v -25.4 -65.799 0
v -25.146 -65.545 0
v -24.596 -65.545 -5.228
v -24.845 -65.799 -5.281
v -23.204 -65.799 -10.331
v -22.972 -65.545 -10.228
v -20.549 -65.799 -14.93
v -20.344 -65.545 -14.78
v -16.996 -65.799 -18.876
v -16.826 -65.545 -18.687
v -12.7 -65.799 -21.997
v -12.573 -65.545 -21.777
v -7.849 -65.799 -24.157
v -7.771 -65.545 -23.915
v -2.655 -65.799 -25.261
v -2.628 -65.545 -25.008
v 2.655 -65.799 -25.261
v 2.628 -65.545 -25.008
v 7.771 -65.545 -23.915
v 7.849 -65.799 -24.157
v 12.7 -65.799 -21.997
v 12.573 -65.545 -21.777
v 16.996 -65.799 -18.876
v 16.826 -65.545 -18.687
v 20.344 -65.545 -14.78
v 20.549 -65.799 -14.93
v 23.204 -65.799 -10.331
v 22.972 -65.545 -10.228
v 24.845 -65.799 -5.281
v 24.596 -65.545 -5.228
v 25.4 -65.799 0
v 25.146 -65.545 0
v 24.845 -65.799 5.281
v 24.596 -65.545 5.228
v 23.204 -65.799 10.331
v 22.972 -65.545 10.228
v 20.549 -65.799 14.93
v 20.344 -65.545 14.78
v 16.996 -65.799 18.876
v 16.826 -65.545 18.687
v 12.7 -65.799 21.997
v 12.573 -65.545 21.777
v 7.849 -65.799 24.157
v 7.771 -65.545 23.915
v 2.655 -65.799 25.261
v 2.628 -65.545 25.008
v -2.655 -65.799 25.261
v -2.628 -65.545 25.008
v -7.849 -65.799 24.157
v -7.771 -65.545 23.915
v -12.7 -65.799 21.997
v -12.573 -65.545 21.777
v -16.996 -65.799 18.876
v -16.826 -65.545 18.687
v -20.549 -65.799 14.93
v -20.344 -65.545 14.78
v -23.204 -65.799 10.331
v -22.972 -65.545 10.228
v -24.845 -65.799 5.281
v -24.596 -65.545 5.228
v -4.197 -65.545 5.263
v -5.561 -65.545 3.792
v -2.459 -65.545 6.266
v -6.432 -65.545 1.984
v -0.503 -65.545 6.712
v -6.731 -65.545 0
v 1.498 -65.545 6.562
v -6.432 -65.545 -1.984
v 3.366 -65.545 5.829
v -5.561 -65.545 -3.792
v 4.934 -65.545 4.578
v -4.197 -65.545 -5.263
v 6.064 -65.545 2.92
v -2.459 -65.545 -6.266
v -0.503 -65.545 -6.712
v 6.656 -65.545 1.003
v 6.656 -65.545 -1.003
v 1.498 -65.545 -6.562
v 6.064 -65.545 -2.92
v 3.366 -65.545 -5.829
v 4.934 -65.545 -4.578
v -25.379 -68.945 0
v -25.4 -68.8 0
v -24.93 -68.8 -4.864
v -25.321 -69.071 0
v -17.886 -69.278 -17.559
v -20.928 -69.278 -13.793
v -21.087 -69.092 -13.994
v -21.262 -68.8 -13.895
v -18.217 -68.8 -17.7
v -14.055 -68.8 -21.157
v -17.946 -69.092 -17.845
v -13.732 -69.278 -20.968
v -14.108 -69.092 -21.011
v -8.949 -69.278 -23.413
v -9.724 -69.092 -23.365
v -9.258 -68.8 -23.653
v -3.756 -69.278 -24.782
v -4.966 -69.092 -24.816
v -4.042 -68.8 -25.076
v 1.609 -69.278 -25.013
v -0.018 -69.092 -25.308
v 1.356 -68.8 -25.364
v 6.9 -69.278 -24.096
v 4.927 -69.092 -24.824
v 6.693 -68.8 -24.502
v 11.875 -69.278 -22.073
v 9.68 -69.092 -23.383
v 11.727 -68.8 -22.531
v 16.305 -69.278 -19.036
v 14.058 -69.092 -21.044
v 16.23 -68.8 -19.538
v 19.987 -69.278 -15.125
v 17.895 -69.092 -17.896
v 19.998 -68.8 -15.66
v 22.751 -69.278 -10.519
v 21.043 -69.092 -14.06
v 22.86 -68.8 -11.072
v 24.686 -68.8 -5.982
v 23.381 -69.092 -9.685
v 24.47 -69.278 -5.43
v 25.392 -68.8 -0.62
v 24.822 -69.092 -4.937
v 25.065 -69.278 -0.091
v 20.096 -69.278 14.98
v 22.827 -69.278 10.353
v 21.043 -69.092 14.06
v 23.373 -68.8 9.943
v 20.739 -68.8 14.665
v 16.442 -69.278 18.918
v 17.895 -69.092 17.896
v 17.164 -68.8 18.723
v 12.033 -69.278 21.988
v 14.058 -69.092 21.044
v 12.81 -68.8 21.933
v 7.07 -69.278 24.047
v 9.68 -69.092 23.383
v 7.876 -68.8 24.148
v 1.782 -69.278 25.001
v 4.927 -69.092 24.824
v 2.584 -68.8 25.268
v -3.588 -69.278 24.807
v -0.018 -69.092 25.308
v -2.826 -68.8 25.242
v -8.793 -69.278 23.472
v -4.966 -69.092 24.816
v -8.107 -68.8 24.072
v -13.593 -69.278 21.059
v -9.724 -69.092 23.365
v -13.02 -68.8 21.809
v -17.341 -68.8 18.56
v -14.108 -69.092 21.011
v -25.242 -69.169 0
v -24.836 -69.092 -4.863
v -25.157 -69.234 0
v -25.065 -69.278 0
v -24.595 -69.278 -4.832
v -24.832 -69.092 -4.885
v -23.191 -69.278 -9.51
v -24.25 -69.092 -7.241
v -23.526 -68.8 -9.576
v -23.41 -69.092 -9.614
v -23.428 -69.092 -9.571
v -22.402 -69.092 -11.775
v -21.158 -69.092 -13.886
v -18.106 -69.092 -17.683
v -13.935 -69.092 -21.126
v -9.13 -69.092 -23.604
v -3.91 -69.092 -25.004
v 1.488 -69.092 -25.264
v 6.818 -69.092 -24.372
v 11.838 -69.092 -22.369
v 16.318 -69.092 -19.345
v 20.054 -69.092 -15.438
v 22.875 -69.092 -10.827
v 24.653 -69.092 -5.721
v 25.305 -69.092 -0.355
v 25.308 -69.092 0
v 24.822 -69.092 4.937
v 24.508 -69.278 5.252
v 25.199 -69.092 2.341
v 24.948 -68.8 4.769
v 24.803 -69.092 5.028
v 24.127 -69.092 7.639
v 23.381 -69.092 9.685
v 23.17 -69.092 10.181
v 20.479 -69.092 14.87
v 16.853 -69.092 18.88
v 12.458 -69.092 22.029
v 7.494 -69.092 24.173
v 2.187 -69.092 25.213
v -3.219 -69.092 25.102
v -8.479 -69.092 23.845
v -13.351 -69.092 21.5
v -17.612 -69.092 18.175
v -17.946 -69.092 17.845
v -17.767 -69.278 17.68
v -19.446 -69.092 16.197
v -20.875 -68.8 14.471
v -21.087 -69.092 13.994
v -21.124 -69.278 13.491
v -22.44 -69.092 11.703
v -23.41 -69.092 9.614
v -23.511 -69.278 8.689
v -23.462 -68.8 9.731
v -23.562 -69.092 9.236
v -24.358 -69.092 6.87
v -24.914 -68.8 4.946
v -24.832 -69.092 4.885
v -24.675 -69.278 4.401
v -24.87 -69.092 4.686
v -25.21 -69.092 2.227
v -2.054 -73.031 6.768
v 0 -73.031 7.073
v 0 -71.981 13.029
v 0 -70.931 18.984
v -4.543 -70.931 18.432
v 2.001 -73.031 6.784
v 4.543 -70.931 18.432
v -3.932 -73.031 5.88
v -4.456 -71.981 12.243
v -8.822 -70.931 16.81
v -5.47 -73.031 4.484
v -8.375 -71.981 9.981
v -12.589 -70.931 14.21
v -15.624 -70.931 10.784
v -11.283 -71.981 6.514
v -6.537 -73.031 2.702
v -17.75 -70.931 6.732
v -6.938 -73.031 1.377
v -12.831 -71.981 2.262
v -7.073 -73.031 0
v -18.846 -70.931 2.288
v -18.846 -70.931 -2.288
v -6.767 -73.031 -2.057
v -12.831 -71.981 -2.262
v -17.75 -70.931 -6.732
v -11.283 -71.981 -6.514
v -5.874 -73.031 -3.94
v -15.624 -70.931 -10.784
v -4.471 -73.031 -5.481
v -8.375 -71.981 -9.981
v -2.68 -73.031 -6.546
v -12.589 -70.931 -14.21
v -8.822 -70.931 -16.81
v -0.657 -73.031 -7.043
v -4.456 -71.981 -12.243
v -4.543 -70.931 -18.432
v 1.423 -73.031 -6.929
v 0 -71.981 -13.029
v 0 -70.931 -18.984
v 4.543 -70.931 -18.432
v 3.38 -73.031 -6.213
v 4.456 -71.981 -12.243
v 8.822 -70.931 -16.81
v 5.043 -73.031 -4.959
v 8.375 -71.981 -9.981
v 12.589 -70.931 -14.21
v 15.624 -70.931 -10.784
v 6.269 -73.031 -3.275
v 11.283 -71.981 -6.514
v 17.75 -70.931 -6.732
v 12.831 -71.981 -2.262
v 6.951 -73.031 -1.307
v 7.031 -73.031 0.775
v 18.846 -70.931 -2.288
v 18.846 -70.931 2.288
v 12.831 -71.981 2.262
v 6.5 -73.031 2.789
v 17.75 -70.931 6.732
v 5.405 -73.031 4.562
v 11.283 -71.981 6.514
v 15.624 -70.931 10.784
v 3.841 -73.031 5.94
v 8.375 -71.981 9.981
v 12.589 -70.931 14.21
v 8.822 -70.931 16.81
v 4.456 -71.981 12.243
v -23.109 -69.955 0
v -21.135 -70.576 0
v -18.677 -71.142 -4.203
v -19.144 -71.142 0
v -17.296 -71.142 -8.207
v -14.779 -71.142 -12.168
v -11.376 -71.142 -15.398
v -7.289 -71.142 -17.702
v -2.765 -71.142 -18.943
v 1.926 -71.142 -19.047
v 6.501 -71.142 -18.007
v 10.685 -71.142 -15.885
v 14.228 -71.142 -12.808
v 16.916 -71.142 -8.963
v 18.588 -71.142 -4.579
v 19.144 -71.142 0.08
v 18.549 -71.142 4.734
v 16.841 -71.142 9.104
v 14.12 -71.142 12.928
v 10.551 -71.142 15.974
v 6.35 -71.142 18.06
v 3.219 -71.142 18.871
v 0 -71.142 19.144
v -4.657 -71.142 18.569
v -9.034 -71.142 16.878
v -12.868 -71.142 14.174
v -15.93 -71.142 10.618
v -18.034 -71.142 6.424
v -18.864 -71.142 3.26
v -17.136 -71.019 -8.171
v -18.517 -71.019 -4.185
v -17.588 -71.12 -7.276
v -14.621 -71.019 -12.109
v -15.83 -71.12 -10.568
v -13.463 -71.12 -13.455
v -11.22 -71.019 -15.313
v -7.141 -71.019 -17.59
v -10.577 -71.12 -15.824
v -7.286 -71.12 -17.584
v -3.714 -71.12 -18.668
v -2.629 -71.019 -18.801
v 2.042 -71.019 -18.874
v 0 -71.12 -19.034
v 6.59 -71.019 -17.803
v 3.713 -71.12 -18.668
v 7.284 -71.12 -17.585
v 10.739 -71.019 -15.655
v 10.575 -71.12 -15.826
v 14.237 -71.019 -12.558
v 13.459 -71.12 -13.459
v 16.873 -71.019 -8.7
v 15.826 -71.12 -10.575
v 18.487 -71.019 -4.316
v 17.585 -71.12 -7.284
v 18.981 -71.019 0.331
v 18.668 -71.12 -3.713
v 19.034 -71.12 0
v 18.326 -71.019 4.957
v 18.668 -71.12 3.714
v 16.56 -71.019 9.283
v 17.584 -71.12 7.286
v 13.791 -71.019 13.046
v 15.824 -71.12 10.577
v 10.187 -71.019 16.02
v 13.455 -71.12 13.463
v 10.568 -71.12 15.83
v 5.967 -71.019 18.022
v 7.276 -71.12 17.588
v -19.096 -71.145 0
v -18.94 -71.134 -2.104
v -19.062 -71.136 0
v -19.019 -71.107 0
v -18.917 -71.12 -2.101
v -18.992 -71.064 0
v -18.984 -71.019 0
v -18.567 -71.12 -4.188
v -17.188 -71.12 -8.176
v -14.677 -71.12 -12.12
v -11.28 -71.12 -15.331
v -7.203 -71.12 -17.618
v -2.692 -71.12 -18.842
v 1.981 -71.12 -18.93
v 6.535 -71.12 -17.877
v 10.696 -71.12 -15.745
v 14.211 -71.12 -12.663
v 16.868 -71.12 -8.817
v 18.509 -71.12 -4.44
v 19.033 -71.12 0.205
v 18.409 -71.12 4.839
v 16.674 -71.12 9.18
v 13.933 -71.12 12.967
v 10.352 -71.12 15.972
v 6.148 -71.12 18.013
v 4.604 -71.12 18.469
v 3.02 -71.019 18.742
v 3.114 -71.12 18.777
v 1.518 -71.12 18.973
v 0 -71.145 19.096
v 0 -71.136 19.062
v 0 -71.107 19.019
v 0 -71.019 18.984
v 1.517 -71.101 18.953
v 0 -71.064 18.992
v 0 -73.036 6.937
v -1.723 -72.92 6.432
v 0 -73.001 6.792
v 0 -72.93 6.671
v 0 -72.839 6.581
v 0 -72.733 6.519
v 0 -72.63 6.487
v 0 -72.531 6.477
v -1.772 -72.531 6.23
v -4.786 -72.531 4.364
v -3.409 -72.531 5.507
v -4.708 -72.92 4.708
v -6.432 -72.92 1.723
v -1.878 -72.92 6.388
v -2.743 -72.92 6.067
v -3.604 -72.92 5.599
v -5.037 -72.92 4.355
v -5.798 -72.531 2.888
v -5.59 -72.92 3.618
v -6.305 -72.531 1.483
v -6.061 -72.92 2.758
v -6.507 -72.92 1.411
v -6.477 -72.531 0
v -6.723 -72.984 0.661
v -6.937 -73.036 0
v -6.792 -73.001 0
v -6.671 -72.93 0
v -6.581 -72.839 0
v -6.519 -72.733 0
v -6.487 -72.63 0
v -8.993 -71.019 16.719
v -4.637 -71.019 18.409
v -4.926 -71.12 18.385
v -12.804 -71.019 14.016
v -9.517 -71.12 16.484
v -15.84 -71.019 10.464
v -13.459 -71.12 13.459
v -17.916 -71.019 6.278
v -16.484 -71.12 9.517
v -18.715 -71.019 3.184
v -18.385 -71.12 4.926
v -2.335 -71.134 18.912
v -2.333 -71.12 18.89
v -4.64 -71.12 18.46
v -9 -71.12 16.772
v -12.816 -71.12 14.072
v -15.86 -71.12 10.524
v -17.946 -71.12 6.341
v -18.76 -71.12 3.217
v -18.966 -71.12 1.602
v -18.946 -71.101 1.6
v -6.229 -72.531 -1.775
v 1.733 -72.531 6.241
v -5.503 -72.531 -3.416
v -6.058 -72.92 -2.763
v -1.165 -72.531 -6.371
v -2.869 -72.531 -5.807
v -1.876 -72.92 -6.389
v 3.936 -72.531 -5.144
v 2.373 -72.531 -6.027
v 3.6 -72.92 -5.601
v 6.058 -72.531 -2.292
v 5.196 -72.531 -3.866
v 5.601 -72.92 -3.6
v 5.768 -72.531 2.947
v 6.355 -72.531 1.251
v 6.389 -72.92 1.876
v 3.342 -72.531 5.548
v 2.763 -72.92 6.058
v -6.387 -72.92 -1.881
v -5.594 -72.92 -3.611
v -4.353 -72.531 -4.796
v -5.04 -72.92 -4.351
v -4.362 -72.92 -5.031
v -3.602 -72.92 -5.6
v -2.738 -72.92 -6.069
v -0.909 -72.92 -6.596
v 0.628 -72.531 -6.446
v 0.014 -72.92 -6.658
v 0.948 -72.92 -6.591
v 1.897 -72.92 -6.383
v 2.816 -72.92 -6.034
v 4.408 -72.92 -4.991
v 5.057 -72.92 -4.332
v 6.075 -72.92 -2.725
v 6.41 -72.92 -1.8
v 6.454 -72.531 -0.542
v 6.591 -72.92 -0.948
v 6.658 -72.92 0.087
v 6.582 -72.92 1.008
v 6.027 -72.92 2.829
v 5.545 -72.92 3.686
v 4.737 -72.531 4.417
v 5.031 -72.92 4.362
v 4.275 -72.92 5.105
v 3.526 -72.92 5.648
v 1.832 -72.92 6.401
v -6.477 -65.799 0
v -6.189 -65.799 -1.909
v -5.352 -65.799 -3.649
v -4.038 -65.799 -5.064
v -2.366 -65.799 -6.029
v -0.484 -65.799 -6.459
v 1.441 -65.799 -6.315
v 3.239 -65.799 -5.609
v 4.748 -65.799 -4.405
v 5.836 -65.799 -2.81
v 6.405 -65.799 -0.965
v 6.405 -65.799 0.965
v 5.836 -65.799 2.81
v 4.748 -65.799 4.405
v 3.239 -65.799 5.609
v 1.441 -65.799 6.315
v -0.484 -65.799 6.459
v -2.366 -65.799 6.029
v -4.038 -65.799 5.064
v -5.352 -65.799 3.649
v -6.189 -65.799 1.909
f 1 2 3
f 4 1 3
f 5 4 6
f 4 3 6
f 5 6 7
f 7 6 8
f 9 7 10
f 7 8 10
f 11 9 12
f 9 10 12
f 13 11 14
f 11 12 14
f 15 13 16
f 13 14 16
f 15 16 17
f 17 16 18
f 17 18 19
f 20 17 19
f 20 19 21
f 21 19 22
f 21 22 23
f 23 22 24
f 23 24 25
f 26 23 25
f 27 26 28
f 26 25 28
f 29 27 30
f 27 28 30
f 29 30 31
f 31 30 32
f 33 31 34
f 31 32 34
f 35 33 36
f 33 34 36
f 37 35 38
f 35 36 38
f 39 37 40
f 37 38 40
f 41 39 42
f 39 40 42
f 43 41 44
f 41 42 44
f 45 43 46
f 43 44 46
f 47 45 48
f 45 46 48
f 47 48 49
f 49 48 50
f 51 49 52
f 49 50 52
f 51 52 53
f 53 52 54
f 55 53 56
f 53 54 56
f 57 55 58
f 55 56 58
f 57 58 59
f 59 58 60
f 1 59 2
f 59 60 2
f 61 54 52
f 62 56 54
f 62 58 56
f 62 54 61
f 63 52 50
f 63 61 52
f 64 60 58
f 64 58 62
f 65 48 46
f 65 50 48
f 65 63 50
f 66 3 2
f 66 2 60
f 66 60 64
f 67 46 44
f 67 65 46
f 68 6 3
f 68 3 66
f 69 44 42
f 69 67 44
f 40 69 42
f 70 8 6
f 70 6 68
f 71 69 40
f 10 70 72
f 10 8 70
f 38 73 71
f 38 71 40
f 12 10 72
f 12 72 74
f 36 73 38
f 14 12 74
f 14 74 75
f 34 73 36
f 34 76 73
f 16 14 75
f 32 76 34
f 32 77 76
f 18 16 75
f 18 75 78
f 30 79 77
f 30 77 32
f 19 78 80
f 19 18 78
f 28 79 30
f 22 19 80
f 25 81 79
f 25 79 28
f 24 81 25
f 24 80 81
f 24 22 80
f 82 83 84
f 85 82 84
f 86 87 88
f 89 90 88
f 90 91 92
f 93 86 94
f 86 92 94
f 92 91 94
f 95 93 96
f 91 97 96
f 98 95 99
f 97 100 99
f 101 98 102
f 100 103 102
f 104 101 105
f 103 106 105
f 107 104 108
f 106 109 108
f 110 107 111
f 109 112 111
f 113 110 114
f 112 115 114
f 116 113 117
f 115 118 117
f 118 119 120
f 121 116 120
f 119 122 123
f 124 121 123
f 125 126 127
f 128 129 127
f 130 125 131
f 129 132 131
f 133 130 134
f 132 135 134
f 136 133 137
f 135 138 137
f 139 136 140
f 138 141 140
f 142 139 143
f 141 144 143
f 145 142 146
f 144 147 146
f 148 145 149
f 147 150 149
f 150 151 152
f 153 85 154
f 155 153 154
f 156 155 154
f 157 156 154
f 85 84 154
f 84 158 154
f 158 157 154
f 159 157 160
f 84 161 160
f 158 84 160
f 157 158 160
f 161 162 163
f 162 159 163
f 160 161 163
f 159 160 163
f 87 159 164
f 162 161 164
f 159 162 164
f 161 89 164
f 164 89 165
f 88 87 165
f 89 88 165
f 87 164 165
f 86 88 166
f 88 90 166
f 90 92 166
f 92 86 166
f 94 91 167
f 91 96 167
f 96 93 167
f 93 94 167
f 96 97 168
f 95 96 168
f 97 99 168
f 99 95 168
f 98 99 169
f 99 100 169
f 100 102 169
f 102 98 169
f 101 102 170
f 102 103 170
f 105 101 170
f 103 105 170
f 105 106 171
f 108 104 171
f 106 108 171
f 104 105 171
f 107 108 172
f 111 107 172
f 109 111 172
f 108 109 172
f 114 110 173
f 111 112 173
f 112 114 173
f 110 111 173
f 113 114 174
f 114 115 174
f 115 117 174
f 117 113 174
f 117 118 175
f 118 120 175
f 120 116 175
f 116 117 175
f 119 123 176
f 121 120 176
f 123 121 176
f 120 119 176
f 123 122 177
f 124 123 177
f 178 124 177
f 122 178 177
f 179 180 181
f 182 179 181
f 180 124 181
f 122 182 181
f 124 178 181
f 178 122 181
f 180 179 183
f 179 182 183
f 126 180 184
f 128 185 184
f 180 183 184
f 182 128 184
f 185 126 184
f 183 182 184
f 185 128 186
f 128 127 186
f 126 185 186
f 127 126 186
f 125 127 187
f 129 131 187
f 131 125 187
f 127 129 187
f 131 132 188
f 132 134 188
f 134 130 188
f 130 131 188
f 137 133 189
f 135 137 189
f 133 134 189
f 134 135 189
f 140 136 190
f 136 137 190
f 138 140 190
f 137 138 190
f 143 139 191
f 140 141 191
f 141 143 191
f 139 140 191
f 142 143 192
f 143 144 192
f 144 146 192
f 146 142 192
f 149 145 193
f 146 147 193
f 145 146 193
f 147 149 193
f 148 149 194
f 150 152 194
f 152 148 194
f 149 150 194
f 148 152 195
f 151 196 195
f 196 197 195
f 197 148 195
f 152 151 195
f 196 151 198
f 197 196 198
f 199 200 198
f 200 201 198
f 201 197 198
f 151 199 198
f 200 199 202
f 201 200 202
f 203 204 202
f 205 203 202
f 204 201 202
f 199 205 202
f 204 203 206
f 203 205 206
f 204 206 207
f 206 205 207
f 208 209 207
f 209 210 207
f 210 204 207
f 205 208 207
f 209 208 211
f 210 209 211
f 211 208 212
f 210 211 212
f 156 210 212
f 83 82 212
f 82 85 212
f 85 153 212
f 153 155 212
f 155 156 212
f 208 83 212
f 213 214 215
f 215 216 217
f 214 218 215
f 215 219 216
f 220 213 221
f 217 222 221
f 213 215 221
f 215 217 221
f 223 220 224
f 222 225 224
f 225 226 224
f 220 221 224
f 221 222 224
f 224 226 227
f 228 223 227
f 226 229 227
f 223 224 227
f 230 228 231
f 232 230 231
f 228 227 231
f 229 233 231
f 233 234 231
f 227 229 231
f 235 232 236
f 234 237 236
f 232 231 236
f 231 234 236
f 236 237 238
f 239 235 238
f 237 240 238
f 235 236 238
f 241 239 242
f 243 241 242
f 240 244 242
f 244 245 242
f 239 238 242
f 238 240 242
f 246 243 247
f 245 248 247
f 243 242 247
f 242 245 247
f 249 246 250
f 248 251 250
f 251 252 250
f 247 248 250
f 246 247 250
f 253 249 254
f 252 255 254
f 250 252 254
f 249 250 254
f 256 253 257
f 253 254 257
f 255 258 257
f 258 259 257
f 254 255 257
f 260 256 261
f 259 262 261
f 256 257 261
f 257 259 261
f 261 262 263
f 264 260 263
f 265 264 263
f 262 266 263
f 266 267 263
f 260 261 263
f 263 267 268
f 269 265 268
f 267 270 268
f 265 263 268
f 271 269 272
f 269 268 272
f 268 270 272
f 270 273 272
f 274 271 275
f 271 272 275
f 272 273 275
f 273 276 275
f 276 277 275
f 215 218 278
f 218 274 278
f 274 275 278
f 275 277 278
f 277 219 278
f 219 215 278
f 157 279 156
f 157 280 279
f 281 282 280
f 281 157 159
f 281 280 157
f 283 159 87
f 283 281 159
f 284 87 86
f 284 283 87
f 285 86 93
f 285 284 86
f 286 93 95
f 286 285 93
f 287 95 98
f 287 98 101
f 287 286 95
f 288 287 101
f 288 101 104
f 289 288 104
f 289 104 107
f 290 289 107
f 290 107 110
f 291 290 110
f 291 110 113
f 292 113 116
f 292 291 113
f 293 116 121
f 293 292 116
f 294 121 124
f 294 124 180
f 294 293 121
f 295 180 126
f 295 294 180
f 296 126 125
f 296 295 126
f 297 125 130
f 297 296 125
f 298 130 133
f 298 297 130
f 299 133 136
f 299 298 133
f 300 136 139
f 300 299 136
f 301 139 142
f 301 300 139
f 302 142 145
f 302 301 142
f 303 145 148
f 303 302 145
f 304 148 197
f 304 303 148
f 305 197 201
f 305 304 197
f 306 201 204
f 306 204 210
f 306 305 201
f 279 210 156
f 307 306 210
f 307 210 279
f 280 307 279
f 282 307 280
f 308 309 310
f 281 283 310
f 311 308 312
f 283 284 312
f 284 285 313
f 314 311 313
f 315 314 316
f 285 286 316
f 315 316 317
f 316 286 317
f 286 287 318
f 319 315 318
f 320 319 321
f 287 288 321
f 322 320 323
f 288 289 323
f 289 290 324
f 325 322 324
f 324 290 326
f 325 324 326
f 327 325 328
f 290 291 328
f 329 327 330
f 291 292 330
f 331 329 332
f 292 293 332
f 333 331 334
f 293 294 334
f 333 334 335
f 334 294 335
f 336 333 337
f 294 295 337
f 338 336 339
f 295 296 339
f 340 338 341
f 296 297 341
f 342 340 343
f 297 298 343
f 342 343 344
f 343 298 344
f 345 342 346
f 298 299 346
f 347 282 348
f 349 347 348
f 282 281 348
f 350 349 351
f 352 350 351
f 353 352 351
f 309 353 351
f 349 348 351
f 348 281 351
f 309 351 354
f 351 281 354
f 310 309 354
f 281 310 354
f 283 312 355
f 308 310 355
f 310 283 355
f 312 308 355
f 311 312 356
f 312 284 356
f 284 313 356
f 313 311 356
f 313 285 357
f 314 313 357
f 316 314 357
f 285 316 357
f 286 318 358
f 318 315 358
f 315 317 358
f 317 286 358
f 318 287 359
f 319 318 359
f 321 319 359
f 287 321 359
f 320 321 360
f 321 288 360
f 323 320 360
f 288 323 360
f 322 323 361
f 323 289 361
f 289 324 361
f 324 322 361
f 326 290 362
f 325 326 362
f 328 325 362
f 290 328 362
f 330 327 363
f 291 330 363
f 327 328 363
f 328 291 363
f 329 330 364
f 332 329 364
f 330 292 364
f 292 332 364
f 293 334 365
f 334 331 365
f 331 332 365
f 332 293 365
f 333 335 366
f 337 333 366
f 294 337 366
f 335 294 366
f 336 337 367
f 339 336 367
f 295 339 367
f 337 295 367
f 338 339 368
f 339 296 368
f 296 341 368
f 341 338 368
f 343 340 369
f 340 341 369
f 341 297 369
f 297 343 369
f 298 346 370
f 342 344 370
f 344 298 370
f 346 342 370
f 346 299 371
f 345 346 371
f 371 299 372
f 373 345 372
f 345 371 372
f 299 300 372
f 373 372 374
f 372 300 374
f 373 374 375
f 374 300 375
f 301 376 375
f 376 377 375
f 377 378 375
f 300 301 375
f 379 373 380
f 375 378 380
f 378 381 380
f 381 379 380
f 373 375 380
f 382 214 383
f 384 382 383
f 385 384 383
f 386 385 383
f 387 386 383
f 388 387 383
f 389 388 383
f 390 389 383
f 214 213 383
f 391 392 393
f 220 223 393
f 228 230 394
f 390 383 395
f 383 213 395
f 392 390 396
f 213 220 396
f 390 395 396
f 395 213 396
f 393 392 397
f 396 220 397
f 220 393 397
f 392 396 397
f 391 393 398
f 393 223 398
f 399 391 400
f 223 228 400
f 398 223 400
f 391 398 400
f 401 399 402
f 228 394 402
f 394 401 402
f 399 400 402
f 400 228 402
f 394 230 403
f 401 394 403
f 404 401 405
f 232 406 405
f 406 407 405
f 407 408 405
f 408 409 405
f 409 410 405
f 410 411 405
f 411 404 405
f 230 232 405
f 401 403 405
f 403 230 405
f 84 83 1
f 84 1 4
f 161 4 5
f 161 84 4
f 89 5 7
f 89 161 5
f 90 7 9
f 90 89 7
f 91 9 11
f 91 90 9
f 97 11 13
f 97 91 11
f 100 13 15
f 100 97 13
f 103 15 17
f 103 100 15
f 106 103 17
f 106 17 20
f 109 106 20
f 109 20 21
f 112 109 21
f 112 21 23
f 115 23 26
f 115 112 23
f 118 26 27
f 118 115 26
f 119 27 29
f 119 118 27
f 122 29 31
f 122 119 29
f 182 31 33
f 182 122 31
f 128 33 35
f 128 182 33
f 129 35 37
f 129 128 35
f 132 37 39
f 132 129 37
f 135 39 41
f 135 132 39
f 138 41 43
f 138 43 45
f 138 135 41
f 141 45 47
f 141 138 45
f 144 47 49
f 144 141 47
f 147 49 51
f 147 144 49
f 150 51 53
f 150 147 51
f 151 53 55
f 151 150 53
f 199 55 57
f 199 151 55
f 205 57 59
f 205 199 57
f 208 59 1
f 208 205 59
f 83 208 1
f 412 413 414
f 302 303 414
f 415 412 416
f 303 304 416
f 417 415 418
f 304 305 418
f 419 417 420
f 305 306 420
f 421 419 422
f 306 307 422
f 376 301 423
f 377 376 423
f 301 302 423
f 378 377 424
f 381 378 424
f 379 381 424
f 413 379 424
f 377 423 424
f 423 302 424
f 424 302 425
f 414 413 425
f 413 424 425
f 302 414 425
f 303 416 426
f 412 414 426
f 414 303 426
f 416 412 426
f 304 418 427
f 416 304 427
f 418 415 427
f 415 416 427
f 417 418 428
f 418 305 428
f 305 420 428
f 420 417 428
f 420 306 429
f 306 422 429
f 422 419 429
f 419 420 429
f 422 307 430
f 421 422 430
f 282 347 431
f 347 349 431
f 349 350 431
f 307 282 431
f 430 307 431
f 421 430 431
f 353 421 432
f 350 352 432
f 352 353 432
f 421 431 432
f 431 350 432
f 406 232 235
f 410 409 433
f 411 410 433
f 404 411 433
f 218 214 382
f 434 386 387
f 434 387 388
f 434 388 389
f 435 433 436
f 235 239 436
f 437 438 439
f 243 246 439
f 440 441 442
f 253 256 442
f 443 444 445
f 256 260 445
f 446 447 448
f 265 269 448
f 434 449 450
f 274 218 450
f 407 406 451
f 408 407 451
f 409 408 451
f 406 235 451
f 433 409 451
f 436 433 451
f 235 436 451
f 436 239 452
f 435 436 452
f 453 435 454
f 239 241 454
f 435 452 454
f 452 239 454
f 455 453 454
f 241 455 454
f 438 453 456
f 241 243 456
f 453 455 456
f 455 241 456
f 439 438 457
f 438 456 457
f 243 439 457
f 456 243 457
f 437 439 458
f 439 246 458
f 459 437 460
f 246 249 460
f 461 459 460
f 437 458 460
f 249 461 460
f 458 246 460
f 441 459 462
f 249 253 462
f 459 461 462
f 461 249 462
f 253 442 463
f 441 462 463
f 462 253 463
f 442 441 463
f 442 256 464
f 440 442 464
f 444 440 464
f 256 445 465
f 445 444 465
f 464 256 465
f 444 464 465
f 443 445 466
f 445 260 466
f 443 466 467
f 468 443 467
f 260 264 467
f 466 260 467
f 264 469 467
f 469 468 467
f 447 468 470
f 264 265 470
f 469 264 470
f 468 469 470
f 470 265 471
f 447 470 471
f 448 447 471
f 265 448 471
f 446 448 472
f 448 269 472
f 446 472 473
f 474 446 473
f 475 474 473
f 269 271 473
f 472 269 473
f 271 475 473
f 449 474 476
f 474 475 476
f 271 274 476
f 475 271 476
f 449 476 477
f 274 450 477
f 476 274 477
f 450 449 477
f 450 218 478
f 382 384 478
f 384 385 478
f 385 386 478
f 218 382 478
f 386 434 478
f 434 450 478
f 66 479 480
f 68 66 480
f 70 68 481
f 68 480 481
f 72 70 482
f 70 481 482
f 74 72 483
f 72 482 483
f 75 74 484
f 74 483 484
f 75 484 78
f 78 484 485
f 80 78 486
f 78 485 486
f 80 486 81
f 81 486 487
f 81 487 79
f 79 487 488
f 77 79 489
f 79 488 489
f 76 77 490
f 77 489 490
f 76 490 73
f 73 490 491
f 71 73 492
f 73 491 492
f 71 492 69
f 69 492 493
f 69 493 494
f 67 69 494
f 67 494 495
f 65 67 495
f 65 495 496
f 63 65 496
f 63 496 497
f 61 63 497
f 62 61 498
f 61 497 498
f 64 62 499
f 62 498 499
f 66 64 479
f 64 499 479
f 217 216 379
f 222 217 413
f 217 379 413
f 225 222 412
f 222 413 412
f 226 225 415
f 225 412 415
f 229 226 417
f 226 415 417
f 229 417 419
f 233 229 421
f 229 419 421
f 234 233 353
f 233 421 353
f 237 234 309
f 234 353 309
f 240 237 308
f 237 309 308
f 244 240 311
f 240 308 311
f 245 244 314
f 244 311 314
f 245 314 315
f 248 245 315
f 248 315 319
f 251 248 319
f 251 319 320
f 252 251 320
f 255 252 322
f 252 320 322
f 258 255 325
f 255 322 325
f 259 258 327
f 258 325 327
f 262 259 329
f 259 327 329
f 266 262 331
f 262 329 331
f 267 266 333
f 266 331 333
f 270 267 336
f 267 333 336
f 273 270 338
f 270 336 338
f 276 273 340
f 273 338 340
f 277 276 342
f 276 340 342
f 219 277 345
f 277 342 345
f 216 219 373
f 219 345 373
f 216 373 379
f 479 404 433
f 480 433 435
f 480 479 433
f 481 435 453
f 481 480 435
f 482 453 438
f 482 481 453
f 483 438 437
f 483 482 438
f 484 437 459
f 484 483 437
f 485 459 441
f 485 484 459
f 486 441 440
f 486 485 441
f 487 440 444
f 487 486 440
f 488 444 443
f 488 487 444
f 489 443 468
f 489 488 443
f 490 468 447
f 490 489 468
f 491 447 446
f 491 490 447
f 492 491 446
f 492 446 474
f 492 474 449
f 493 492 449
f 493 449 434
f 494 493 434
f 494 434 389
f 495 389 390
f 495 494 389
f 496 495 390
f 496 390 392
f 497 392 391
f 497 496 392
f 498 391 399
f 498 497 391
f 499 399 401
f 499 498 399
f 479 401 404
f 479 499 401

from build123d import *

# Parameters (mm, degrees)
CHAMFER2_SIZE = 0.254
FILLET2_R     = 0.508
FILLET3_R     = 0.127


with BuildPart() as part:
    # Sketch2 → Revolve2 (revolve)
    with BuildSketch(Plane.XY, mode=Mode.PRIVATE) as revolve2_sk:
        with BuildLine():
            Line((25.4, -65.5447), (25.4, -69.155670232))
            ThreePointArc((25.4, -69.155670232), (16.078331209, -71.896828795), (6.477, -73.387432141))
            Line((6.477, -73.387432141), (6.477, -65.5447))
            Line((6.477, -65.5447), (25.4, -65.5447))
        make_face()
    revolve(revolve2_sk.sketch.rotate(Axis((0, -73.6727, 0), (0, -1, 0)), 180), axis=Axis((0, -73.6727, 0), (0, -1, 0)))  # turned: the seam where the file's is

    # Sketch3 → Cut-Revolve1 (revolve, cut)
    with BuildSketch(Plane.XY, mode=Mode.PRIVATE) as cut_revolve1_sk:
        with BuildLine():
            Line((6.477, -73.387432141), (6.477, -73.136107262))
            Line((6.477, -73.136107262), (18.984058463, -70.930775406))
            Line((18.984058463, -70.930775406), (18.984058463, -71.184775406))
            ThreePointArc((18.984058463, -71.184775406), (12.778078834, -72.55609848), (6.477, -73.387432141))
        make_face()
    revolve(cut_revolve1_sk.sketch.rotate(Axis((0, 0, 0), (0, -1, 0)), 90), axis=Axis((0, 0, 0), (0, -1, 0)), mode=Mode.SUBTRACT)  # turned: the seam where the file's is

    # Chamfer2
    chamfer2_edges = [part.edges().sort_by_distance(p)[0] for p in [
        (25.4, -65.5447, 0),
        (6.477, -65.5447, 0),
    ]]
    chamfer(chamfer2_edges, length=CHAMFER2_SIZE)

    # Fillet2
    fillet2_edges = [part.edges().sort_by_distance(p)[0] for p in [
        (4.579930622, -73.136107262, -4.579930622),
        (25.4, -69.155670232, 0),
    ]]
    fillet(fillet2_edges, radius=FILLET2_R)

    # Fillet3
    fillet3_edges = [part.edges().sort_by_distance(p)[0] for p in [
        (13.423756474, -71.184775406, -13.423756474),
    ]]
    fillet(fillet3_edges, radius=FILLET3_R)


solid = part.part
